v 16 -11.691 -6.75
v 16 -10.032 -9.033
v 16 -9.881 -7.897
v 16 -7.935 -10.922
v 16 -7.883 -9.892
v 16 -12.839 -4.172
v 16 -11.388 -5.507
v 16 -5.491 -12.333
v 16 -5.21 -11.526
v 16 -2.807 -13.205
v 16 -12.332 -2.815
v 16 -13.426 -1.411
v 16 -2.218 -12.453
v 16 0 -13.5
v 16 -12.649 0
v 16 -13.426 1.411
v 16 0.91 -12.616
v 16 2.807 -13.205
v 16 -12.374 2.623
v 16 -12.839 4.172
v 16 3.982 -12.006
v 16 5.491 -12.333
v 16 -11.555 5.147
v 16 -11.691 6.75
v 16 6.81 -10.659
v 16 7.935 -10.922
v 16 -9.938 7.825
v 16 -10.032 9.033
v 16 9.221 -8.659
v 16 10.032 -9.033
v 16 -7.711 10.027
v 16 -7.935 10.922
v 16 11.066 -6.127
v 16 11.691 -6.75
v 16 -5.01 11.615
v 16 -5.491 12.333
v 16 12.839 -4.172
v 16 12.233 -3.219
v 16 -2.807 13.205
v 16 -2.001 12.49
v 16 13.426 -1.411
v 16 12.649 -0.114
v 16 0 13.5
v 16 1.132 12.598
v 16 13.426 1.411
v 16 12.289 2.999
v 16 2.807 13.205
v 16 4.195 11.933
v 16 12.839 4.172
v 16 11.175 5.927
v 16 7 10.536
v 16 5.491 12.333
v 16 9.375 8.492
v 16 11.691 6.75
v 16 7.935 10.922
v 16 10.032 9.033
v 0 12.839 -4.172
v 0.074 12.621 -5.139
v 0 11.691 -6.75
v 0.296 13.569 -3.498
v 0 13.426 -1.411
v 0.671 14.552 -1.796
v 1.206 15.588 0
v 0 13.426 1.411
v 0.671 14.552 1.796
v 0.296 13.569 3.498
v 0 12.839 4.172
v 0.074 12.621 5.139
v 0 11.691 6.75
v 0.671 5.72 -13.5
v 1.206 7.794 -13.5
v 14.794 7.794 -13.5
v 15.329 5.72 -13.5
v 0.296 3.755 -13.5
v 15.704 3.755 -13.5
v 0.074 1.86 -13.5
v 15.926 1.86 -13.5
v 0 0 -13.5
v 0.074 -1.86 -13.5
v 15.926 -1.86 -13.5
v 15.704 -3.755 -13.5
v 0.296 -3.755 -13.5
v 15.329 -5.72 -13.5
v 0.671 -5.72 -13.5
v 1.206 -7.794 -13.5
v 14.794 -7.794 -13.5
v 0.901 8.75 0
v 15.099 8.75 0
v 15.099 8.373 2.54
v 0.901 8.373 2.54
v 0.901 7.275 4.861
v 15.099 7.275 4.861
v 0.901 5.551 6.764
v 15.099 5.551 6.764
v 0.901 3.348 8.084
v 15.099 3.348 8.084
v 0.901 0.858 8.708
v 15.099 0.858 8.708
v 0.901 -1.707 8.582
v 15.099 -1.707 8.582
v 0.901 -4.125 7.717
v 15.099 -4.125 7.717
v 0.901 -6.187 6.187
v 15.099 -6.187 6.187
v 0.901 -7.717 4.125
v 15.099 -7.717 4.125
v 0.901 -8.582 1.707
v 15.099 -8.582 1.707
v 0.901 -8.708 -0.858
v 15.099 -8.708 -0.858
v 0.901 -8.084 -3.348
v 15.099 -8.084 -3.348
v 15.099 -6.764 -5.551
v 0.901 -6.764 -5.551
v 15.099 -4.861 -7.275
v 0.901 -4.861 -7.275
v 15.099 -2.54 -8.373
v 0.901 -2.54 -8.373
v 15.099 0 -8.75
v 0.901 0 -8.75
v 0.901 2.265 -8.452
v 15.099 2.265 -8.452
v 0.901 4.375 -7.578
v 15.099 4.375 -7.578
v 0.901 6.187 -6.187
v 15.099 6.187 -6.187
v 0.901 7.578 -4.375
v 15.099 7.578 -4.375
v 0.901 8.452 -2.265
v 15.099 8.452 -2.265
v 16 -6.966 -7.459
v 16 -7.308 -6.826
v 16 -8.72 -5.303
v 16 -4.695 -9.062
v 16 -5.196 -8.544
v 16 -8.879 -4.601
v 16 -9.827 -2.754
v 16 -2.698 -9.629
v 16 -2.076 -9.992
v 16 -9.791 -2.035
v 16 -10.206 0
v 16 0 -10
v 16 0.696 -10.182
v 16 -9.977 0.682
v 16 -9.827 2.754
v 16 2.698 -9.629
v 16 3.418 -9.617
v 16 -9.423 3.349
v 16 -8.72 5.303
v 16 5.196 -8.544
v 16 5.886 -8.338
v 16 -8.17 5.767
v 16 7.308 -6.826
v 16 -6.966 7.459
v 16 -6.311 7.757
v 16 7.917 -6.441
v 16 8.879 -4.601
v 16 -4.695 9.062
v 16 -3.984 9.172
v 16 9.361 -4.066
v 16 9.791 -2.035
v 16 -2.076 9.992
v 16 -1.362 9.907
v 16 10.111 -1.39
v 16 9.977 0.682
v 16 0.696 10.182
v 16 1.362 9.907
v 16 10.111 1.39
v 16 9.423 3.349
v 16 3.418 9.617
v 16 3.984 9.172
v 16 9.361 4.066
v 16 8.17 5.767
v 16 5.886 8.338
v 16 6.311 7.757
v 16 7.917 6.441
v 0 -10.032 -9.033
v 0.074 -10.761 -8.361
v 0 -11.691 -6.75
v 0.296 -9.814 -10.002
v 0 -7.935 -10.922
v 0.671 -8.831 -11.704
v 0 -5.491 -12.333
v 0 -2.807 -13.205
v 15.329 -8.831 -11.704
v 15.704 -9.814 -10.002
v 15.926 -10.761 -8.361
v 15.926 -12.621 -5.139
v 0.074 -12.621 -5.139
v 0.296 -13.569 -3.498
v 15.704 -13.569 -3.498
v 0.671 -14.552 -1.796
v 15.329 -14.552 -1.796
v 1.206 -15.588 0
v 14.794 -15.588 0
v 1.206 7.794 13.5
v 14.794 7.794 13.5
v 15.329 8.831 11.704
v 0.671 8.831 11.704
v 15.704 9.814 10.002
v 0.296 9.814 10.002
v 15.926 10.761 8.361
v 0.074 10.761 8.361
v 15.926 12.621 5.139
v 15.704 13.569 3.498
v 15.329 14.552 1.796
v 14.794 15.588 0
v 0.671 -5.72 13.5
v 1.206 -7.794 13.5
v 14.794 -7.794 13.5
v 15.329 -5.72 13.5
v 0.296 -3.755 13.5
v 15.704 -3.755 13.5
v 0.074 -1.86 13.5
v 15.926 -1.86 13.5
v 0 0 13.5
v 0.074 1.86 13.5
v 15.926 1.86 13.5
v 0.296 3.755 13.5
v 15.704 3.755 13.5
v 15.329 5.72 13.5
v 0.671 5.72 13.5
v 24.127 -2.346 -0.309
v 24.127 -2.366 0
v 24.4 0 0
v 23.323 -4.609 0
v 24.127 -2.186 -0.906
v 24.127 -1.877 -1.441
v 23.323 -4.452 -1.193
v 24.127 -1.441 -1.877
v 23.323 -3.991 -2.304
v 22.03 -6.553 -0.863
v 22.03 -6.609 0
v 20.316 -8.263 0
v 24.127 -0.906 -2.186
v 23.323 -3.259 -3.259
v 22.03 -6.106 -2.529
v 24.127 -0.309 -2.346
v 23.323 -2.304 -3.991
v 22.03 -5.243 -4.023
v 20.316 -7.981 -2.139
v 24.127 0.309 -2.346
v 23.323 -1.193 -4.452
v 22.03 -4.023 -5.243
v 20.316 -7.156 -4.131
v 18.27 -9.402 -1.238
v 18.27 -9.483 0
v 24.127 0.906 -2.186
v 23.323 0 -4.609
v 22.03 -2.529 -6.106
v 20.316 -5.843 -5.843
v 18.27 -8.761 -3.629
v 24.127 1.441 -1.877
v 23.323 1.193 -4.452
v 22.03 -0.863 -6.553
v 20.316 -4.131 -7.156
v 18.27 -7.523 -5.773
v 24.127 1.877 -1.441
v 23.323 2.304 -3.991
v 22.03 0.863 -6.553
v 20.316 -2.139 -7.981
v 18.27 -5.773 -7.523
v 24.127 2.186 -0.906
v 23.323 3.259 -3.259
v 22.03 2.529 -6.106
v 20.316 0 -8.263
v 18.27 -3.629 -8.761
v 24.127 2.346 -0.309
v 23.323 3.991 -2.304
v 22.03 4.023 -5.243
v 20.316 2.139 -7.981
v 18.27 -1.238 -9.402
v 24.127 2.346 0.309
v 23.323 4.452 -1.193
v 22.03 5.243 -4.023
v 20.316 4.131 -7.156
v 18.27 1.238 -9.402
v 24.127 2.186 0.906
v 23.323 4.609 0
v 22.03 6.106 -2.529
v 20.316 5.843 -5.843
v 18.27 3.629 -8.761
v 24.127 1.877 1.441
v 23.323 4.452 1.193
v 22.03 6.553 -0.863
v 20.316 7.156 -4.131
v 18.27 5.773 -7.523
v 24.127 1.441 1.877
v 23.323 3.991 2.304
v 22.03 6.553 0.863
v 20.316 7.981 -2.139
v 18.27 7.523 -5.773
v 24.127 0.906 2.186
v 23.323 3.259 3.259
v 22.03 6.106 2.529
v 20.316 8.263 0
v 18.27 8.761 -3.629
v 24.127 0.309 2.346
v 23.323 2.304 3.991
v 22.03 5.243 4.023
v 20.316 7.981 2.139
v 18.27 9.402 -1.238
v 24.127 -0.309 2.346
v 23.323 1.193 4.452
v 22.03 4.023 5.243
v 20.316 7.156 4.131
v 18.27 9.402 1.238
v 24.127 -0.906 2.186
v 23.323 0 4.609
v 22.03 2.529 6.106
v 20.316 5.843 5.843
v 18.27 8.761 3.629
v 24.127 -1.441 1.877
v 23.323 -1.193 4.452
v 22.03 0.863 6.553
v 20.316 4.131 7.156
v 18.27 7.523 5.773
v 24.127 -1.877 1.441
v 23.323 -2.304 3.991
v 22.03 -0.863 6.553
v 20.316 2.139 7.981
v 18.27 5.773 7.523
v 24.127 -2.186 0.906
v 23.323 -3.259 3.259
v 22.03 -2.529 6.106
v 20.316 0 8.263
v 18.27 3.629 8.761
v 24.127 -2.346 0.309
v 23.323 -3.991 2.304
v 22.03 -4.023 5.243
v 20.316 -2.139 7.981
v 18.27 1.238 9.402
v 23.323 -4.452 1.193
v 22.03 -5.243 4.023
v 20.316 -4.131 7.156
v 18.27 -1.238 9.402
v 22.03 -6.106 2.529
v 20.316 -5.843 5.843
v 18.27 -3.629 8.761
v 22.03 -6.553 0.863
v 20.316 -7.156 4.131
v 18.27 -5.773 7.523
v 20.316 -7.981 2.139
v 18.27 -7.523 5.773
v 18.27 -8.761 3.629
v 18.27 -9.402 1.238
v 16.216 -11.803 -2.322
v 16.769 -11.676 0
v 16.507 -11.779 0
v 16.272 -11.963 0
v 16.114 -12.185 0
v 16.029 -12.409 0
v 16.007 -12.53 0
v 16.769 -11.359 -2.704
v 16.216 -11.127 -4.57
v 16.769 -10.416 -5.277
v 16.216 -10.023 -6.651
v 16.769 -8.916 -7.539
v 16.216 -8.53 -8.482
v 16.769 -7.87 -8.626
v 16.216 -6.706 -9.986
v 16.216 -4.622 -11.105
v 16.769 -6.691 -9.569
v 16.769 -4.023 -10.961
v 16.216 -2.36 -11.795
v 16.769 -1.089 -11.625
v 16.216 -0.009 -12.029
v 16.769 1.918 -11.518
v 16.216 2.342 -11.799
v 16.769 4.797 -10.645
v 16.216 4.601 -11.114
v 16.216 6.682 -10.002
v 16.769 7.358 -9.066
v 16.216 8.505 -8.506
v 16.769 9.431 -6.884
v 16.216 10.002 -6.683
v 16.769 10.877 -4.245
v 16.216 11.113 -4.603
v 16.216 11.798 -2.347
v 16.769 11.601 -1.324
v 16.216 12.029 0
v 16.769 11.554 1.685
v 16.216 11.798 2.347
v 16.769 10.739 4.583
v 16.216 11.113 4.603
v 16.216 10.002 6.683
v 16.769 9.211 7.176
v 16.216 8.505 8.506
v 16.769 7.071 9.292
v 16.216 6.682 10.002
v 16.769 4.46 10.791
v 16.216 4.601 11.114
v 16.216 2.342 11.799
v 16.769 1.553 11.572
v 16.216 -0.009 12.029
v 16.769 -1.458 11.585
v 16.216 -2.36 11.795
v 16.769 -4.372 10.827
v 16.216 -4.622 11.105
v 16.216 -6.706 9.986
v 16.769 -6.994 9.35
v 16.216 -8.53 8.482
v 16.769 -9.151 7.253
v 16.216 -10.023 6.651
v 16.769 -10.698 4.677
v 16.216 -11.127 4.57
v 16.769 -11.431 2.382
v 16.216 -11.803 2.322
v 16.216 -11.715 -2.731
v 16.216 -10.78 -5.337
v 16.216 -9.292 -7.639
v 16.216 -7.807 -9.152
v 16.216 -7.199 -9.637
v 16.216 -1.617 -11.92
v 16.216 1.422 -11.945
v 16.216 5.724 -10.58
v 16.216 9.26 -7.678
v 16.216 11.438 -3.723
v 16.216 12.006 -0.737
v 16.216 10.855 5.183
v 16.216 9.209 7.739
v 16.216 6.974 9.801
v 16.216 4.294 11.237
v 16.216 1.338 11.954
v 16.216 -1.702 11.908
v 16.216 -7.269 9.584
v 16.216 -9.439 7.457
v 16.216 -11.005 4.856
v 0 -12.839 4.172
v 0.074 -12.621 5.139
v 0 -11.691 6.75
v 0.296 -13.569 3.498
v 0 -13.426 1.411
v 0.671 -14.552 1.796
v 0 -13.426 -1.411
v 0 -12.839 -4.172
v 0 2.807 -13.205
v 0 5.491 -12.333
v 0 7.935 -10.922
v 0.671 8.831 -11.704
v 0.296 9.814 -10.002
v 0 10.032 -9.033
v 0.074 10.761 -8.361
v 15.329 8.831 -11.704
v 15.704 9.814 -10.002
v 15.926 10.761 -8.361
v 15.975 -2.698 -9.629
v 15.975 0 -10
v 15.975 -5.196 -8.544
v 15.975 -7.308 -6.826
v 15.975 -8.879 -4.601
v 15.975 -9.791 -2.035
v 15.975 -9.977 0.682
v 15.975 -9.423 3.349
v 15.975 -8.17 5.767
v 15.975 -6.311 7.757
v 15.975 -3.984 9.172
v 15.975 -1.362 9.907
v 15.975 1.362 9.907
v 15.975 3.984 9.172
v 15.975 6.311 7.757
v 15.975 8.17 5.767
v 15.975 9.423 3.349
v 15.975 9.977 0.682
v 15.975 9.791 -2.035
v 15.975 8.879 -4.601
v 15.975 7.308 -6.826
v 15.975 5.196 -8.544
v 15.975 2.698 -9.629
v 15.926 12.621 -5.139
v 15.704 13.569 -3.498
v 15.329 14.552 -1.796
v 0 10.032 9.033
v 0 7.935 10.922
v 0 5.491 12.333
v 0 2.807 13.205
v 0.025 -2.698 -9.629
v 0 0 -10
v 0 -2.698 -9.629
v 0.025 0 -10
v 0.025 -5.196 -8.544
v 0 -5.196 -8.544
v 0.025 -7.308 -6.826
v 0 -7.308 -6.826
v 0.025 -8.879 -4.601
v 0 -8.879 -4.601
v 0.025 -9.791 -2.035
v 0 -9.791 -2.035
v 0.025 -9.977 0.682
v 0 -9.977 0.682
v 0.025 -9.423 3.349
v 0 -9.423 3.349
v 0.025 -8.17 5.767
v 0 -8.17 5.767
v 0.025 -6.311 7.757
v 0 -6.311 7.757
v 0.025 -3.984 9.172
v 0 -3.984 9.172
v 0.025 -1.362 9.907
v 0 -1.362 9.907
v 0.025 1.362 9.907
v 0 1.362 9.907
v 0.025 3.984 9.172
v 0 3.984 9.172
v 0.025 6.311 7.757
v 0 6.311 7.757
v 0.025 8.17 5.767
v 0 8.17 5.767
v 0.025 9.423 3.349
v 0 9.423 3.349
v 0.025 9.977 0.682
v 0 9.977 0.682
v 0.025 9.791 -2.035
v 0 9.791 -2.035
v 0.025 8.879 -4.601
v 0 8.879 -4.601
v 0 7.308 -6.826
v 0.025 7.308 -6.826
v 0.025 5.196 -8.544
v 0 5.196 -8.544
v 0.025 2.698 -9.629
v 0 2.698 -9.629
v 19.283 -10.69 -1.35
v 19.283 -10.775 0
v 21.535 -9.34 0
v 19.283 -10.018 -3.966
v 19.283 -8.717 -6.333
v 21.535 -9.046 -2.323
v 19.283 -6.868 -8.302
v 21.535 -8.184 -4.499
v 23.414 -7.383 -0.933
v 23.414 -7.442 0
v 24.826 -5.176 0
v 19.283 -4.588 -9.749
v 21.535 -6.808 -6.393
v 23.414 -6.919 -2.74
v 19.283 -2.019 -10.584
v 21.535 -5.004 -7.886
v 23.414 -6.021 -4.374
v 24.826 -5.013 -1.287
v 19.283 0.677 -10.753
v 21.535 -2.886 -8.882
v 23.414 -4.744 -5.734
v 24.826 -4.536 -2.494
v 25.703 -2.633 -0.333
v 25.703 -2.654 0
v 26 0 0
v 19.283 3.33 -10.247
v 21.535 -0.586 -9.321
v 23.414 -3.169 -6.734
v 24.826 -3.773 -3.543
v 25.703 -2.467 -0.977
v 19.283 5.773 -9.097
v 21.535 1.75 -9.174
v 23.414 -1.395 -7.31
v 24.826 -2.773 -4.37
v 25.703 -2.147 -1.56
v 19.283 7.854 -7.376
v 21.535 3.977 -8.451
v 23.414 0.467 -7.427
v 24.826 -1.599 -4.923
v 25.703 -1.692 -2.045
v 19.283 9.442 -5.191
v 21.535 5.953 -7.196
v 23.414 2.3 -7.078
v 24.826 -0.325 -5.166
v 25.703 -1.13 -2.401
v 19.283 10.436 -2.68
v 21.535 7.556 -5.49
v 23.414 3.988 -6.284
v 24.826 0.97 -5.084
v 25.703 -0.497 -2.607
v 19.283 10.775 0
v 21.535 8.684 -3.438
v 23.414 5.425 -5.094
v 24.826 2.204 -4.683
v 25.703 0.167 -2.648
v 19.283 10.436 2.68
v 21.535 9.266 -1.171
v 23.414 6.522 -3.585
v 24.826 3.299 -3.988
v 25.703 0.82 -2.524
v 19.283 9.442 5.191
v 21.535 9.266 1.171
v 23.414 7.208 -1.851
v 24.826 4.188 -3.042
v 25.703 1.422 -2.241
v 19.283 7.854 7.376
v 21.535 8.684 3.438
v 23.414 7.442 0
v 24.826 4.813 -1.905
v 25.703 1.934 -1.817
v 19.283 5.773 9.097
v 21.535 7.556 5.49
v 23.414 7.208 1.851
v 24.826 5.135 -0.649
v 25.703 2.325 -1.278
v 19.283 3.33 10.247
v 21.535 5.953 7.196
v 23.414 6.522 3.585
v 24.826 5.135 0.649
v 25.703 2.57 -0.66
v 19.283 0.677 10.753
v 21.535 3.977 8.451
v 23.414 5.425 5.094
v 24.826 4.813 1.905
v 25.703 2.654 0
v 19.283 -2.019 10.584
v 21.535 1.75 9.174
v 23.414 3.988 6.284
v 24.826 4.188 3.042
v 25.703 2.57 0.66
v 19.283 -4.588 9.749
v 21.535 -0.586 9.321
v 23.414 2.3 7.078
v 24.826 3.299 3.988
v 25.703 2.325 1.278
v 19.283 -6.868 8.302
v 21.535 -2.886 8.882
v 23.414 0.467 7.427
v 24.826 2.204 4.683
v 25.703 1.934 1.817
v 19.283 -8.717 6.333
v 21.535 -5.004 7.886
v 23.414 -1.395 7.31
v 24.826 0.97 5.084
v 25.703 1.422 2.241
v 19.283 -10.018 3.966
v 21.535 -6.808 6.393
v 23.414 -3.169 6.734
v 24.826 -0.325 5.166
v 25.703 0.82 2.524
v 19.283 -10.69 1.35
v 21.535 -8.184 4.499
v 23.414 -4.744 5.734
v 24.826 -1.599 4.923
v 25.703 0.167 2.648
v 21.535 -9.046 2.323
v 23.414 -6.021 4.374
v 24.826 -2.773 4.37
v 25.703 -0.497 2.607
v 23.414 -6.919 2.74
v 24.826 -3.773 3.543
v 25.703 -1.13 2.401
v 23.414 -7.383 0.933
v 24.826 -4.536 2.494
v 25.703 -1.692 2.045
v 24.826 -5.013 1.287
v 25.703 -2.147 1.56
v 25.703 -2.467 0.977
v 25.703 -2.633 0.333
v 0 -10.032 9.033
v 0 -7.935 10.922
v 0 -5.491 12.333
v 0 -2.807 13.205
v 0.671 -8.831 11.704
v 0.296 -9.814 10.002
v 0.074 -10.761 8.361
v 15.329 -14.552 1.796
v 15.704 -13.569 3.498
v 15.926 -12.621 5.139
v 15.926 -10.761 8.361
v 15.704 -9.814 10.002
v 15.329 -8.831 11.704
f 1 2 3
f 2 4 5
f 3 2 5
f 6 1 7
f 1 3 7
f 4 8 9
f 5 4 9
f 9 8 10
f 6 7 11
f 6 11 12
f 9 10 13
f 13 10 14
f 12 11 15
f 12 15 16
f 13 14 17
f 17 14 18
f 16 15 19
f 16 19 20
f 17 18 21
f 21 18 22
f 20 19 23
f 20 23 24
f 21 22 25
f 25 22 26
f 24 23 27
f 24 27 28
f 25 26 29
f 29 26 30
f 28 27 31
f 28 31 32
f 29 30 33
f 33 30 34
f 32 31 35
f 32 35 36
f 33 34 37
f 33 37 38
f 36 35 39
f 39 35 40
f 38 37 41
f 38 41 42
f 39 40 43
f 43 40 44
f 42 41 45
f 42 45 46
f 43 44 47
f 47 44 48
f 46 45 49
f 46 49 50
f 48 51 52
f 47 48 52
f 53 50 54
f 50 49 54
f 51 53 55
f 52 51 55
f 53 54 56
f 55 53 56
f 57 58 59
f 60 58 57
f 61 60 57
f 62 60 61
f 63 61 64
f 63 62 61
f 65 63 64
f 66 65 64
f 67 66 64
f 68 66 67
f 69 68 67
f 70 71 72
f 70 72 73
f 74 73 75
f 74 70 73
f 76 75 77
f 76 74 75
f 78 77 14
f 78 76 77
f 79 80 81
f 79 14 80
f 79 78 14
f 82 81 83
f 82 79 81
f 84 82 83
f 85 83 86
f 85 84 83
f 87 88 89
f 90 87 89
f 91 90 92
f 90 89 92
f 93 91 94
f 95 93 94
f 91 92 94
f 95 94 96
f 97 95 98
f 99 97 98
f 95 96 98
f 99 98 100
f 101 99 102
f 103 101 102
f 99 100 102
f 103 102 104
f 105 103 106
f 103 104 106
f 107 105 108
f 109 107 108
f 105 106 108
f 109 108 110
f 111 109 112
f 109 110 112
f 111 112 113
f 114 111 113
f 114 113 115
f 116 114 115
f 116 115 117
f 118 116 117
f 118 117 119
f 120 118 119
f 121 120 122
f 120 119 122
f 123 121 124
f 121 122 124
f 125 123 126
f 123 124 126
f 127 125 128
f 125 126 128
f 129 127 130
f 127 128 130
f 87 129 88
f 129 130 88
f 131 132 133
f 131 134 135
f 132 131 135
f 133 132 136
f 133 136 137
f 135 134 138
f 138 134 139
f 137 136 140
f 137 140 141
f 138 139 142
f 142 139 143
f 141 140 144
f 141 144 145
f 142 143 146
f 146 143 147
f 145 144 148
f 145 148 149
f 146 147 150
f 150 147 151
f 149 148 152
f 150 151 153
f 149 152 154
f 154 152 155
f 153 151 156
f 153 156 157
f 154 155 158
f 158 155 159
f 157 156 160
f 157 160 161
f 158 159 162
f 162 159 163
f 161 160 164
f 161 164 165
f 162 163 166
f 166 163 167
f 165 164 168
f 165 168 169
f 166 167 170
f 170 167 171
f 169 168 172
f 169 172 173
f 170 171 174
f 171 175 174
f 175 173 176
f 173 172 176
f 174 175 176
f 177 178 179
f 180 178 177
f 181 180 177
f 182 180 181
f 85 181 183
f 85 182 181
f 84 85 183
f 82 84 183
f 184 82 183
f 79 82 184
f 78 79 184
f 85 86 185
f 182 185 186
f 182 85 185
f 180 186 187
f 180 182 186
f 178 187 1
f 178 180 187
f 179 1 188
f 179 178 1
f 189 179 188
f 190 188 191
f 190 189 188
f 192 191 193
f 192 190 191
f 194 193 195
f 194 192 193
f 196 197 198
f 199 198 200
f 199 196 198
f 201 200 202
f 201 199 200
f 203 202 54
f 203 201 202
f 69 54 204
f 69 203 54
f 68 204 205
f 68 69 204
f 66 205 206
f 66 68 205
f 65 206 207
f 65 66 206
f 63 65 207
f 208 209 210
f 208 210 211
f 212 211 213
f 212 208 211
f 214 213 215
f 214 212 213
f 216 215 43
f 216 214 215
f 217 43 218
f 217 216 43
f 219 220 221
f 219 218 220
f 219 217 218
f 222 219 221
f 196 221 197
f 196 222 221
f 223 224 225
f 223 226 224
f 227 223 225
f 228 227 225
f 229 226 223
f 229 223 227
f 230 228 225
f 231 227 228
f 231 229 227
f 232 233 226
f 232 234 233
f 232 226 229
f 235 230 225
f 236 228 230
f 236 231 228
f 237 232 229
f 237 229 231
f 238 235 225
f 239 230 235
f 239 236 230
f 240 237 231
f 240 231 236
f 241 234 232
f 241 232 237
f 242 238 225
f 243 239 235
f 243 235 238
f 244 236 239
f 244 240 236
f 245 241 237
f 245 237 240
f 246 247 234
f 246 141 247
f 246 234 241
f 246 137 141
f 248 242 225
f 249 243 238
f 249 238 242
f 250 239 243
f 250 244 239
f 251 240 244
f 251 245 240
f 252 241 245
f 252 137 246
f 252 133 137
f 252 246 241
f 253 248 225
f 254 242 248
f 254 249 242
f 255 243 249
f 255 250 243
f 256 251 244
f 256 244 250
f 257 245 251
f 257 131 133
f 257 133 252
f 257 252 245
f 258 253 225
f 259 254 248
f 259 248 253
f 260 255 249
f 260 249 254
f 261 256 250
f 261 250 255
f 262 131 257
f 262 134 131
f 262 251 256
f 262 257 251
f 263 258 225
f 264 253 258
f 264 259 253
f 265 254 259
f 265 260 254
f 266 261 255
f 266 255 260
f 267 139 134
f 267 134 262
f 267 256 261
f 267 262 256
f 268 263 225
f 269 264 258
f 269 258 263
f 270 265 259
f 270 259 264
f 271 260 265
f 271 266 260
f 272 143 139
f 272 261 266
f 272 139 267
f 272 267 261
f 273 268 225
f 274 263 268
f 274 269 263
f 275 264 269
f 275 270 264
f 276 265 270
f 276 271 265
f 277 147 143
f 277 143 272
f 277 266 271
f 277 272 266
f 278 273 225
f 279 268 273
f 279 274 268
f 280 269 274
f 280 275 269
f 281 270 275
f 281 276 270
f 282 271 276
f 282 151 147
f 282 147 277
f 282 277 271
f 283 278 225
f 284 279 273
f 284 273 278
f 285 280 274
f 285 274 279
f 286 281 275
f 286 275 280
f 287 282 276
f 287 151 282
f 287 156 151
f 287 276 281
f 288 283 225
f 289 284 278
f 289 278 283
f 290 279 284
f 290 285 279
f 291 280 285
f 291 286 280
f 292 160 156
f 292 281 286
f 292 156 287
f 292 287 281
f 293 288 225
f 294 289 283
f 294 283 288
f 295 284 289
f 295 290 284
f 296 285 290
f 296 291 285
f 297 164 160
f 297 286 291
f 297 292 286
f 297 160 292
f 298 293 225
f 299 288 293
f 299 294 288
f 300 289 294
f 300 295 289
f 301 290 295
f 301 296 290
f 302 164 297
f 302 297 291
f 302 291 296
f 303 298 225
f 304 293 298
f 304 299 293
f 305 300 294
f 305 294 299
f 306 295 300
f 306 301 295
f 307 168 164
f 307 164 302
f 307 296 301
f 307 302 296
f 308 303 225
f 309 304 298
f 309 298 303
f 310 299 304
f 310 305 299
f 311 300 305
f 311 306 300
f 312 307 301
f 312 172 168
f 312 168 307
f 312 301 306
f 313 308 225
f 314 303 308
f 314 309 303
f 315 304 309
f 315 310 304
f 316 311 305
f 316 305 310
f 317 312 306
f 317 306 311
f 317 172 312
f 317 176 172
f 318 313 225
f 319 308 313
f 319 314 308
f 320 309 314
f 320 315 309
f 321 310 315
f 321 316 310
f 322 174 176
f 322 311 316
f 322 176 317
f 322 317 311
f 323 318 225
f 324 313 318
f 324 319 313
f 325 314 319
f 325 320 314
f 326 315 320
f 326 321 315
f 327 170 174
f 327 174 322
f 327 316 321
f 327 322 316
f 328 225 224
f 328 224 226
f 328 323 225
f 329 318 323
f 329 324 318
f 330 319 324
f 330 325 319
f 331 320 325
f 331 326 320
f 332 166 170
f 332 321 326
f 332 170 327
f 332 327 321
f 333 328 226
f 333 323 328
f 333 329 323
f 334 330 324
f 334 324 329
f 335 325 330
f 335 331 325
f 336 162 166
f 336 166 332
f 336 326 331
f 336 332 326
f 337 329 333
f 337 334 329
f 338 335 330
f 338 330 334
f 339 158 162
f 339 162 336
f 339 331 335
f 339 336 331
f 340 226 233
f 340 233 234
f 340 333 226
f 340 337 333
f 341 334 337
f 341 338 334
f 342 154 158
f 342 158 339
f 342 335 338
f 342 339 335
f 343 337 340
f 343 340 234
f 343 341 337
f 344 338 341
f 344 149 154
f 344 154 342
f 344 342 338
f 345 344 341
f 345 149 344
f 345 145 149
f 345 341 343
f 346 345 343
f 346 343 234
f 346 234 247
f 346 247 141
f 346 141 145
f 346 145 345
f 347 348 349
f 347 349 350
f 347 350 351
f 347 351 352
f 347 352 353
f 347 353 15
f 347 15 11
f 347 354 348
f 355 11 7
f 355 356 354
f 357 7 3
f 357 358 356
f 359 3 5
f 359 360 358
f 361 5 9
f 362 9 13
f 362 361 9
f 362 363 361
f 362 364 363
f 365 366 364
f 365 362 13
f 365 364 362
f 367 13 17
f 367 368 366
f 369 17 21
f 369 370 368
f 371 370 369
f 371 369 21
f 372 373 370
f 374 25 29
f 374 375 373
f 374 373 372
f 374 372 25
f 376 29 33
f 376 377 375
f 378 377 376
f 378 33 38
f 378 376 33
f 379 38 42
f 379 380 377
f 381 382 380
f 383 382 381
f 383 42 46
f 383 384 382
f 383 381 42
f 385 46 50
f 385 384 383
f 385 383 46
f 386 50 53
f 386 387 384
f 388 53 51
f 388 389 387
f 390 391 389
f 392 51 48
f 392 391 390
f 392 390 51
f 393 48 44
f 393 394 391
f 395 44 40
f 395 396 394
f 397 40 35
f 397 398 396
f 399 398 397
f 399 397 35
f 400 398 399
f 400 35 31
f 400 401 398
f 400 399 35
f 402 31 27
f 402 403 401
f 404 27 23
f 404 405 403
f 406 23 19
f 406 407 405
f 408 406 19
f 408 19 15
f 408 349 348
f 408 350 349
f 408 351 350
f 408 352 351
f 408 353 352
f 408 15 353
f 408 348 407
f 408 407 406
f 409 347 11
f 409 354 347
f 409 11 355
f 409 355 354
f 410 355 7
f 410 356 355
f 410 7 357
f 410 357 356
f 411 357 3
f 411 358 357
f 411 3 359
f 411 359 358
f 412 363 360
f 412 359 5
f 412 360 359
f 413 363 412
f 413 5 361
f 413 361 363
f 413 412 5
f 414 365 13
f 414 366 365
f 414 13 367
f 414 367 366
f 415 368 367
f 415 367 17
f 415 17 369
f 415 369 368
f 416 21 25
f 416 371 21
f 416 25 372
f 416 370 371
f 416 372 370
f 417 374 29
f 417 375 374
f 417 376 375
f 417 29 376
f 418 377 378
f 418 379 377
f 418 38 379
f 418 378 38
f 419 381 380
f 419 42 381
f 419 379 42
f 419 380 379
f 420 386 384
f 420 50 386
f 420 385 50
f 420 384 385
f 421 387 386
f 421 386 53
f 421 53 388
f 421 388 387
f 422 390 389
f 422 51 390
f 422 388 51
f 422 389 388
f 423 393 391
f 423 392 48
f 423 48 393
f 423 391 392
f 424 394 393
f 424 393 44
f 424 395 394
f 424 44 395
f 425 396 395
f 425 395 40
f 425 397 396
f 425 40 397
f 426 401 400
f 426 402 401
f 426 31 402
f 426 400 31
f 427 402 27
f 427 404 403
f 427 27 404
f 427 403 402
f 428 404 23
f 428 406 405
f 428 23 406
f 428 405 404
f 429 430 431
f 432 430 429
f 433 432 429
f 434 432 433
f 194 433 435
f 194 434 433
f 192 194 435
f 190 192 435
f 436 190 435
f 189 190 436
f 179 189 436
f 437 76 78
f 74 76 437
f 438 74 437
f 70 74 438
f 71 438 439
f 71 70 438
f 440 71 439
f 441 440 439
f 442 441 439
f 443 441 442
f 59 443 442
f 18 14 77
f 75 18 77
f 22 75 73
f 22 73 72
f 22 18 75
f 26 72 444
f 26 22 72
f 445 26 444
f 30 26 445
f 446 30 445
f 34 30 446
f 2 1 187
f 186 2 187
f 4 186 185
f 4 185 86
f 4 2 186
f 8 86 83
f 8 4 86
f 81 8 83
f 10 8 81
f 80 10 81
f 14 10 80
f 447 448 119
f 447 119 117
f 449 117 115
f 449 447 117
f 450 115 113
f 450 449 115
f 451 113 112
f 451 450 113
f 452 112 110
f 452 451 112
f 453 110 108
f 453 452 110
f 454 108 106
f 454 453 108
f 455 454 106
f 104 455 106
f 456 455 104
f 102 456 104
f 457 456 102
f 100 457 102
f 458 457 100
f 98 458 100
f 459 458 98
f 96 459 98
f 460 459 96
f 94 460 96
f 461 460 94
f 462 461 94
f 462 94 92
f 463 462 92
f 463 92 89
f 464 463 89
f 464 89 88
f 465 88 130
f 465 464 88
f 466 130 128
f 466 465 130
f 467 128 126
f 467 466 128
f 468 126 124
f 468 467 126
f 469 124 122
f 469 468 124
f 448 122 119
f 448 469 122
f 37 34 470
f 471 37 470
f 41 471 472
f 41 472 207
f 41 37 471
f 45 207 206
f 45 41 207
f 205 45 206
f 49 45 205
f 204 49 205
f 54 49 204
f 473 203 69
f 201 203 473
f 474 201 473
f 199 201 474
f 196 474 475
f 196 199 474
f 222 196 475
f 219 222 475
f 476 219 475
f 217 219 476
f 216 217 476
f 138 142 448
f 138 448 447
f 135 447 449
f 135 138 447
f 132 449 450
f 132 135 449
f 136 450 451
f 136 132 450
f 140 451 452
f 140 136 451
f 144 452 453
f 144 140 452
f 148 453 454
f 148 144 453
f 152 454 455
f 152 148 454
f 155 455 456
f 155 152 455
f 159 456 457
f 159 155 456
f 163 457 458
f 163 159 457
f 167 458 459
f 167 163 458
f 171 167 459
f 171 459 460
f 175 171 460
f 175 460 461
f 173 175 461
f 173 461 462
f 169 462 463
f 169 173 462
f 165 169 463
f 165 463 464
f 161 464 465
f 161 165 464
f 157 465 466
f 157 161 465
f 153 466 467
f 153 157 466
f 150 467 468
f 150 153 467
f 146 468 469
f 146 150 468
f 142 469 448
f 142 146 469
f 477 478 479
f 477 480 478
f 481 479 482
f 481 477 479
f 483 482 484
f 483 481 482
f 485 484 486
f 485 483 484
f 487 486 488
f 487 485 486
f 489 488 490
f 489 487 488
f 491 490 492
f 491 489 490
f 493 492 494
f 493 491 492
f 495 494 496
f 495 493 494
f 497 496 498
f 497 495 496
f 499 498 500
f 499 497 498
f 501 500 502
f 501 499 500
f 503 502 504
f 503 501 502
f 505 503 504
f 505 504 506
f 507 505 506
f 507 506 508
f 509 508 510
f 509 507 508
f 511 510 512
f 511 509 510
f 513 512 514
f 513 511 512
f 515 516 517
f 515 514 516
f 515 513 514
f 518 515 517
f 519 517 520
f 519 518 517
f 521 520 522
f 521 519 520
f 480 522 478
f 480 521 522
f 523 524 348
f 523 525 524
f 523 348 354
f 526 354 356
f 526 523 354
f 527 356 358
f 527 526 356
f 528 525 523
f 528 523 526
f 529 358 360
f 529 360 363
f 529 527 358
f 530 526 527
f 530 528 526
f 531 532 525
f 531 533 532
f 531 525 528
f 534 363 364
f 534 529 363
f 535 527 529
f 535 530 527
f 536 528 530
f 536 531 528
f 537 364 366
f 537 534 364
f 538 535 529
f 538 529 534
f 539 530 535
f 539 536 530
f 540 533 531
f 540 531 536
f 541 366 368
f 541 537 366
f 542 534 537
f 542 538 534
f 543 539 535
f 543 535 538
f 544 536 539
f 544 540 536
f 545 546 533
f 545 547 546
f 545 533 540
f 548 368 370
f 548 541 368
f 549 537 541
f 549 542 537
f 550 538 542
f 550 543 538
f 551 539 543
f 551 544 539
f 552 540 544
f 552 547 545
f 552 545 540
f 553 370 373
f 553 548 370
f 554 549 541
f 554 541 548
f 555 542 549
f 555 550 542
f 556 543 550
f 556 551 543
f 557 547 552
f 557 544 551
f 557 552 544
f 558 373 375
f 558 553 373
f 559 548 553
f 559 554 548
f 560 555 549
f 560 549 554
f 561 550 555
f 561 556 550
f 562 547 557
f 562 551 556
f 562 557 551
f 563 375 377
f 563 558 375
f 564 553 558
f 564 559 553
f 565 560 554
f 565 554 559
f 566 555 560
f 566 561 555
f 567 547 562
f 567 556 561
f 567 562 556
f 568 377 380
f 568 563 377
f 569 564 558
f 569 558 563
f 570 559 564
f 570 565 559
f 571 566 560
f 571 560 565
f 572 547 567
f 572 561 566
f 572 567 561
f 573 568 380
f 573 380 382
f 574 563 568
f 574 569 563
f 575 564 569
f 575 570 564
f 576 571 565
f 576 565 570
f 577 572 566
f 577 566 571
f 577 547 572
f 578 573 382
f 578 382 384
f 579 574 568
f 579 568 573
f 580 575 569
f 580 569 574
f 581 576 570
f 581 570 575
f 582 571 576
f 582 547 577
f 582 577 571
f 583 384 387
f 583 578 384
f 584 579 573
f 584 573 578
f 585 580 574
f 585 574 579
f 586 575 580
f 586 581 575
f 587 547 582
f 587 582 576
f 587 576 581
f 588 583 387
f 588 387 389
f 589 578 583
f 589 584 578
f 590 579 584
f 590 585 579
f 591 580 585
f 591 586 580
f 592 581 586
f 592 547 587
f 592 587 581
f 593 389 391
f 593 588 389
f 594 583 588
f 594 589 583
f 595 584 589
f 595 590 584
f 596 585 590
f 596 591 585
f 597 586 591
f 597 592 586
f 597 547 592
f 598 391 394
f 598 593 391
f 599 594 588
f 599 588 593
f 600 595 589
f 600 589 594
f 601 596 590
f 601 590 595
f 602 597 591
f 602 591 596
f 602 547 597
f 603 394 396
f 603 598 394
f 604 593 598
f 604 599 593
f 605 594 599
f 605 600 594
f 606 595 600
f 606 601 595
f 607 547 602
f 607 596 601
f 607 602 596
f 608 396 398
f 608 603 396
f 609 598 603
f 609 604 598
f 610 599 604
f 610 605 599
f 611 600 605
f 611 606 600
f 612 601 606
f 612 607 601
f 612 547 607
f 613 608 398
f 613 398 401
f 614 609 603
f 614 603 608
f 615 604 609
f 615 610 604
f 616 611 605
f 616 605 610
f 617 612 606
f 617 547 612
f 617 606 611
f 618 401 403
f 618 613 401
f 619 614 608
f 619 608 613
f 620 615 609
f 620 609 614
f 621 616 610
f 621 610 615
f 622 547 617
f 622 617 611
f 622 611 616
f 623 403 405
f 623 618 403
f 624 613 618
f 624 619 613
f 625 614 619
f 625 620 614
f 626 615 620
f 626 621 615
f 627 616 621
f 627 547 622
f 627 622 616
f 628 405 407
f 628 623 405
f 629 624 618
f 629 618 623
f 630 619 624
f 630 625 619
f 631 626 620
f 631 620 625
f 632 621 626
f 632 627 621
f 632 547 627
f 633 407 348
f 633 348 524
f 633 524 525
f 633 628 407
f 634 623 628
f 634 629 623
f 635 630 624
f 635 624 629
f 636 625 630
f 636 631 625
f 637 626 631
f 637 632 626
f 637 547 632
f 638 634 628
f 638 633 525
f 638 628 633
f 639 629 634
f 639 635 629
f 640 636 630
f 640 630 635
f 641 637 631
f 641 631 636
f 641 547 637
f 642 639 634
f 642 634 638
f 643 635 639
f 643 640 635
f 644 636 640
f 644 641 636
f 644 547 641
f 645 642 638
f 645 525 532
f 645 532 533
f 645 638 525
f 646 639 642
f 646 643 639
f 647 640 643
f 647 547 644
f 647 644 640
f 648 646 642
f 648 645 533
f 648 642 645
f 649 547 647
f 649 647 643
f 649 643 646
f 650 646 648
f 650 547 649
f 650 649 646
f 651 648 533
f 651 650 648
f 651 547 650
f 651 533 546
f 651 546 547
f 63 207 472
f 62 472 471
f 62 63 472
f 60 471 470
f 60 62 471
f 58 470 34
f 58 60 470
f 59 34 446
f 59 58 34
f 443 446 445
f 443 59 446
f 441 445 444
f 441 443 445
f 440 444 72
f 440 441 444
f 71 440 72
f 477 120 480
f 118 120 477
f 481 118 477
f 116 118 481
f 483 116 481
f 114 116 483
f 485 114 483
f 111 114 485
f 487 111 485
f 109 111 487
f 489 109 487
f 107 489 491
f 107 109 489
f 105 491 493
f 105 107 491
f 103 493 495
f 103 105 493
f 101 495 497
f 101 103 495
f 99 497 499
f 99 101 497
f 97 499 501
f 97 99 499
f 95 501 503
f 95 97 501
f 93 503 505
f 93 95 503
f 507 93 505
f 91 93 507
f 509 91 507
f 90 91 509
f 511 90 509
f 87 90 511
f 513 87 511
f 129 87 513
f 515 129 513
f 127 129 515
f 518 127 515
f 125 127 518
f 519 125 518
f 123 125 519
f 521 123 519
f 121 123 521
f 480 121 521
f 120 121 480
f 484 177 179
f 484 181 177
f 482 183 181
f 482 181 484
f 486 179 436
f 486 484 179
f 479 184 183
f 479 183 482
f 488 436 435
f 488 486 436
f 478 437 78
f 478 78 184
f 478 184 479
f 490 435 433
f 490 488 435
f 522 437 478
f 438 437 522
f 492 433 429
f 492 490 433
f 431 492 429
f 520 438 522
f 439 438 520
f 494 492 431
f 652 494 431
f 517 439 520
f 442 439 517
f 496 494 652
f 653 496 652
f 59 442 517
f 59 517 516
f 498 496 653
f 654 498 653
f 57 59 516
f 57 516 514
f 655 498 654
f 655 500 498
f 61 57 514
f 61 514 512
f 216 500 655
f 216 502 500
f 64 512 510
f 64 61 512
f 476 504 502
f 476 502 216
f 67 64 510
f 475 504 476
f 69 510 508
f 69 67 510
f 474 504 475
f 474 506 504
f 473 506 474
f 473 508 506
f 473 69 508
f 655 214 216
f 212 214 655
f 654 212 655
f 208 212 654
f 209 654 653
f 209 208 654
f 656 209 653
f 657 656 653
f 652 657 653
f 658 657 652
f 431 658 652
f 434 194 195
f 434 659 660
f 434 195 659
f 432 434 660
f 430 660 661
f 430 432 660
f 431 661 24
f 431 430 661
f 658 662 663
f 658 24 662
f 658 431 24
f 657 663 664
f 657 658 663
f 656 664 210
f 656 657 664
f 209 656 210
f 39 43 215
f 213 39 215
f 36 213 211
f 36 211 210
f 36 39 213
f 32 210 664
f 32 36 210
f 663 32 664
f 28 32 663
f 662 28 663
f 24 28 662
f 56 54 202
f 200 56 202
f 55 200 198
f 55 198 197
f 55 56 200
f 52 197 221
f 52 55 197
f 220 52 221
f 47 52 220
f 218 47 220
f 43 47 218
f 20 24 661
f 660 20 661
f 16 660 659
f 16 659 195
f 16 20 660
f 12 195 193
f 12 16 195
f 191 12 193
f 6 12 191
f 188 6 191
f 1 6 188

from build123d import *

# Parameters (mm, degrees)
BASENUT_DEPTH = 16
DOMEFILLET_R  = 1


with BuildPart() as part:
    # BaseNutSke → BaseNut (new body)
    with BuildSketch(Plane(origin=(0, 0, 0), x_dir=(0, 0, -1), z_dir=(1, 0, 0))):
        Polygon((13.5, 7.794228634), (13.5, -7.794228634), (0, -15.588457268), (-13.5, -7.794228634), (-13.5, 7.794228634), (0, 15.588457268), align=None)
    extrude(amount=BASENUT_DEPTH)

    # DomeSke → Dome (revolve)
    with BuildSketch(Plane.XY, mode=Mode.PRIVATE) as dome_sk:
        with BuildLine():
            Line((26, 0), (24.4, 0))
            ThreePointArc((24.4, 0), (21.353910524, 7.353910524), (14, 10.4))
            Line((14, 10.4), (0, 10.4))
            Line((0, 10.4), (0, 12))
            Line((0, 12), (14, 12))
            ThreePointArc((14, 12), (22.485281374, 8.485281374), (26, 0))
        make_face()
    revolve(dome_sk.sketch.rotate(Axis((0, 0, 0), (1, 0, 0)), 180), axis=Axis((0, 0, 0), (1, 0, 0)))

    # Sketch4 → DoubleChamfer (revolve, cut)
    with BuildSketch(Plane.XY):
        Polygon((0, 13.5), (2.504809472, 17.838457268), (13.495190528, 17.838457268), (16, 13.5), (18, 13.5), (18, 28.5), (-2, 28.5), (-2, 13.5), align=None)
    revolve(axis=Axis((0, 0, 0), (1, 0, 0)), mode=Mode.SUBTRACT)

    # TapDriSke → TapDrill (revolve, cut)
    with BuildSketch(Plane.XY):
        Polygon((0, 8.75), (18.4, 8.75), (23.657530416, 0), (0, 0), align=None)
    revolve(axis=Axis((0, 0, 0), (1, 0, 0)), mode=Mode.SUBTRACT)

    # EndChamferSketch → EndChamfer (revolve, cut)
    with BuildSketch(Plane.XY, mode=Mode.PRIVATE) as endchamfer_sk:
        Polygon((-0.0746, 10), (0.0254, 10), (0.988185365, 8.625), (-0.0746, 8.625), align=None)
        Polygon((15.9746, 10), (16.1, 10), (16.1, 8.625), (15.011814635, 8.625), align=None)
    revolve(endchamfer_sk.sketch.rotate(Axis((0, 0, 0), (-1, 0, 0)), 90), axis=Axis((0, 0, 0), (-1, 0, 0)), mode=Mode.SUBTRACT)

    # DomeFillet
    domefillet_edges = [part.edges().sort_by_distance(p)[0] for p in [
        (16, 11.832159566, 0),
    ]]
    fillet(domefillet_edges, radius=DOMEFILLET_R)


solid = part.part
